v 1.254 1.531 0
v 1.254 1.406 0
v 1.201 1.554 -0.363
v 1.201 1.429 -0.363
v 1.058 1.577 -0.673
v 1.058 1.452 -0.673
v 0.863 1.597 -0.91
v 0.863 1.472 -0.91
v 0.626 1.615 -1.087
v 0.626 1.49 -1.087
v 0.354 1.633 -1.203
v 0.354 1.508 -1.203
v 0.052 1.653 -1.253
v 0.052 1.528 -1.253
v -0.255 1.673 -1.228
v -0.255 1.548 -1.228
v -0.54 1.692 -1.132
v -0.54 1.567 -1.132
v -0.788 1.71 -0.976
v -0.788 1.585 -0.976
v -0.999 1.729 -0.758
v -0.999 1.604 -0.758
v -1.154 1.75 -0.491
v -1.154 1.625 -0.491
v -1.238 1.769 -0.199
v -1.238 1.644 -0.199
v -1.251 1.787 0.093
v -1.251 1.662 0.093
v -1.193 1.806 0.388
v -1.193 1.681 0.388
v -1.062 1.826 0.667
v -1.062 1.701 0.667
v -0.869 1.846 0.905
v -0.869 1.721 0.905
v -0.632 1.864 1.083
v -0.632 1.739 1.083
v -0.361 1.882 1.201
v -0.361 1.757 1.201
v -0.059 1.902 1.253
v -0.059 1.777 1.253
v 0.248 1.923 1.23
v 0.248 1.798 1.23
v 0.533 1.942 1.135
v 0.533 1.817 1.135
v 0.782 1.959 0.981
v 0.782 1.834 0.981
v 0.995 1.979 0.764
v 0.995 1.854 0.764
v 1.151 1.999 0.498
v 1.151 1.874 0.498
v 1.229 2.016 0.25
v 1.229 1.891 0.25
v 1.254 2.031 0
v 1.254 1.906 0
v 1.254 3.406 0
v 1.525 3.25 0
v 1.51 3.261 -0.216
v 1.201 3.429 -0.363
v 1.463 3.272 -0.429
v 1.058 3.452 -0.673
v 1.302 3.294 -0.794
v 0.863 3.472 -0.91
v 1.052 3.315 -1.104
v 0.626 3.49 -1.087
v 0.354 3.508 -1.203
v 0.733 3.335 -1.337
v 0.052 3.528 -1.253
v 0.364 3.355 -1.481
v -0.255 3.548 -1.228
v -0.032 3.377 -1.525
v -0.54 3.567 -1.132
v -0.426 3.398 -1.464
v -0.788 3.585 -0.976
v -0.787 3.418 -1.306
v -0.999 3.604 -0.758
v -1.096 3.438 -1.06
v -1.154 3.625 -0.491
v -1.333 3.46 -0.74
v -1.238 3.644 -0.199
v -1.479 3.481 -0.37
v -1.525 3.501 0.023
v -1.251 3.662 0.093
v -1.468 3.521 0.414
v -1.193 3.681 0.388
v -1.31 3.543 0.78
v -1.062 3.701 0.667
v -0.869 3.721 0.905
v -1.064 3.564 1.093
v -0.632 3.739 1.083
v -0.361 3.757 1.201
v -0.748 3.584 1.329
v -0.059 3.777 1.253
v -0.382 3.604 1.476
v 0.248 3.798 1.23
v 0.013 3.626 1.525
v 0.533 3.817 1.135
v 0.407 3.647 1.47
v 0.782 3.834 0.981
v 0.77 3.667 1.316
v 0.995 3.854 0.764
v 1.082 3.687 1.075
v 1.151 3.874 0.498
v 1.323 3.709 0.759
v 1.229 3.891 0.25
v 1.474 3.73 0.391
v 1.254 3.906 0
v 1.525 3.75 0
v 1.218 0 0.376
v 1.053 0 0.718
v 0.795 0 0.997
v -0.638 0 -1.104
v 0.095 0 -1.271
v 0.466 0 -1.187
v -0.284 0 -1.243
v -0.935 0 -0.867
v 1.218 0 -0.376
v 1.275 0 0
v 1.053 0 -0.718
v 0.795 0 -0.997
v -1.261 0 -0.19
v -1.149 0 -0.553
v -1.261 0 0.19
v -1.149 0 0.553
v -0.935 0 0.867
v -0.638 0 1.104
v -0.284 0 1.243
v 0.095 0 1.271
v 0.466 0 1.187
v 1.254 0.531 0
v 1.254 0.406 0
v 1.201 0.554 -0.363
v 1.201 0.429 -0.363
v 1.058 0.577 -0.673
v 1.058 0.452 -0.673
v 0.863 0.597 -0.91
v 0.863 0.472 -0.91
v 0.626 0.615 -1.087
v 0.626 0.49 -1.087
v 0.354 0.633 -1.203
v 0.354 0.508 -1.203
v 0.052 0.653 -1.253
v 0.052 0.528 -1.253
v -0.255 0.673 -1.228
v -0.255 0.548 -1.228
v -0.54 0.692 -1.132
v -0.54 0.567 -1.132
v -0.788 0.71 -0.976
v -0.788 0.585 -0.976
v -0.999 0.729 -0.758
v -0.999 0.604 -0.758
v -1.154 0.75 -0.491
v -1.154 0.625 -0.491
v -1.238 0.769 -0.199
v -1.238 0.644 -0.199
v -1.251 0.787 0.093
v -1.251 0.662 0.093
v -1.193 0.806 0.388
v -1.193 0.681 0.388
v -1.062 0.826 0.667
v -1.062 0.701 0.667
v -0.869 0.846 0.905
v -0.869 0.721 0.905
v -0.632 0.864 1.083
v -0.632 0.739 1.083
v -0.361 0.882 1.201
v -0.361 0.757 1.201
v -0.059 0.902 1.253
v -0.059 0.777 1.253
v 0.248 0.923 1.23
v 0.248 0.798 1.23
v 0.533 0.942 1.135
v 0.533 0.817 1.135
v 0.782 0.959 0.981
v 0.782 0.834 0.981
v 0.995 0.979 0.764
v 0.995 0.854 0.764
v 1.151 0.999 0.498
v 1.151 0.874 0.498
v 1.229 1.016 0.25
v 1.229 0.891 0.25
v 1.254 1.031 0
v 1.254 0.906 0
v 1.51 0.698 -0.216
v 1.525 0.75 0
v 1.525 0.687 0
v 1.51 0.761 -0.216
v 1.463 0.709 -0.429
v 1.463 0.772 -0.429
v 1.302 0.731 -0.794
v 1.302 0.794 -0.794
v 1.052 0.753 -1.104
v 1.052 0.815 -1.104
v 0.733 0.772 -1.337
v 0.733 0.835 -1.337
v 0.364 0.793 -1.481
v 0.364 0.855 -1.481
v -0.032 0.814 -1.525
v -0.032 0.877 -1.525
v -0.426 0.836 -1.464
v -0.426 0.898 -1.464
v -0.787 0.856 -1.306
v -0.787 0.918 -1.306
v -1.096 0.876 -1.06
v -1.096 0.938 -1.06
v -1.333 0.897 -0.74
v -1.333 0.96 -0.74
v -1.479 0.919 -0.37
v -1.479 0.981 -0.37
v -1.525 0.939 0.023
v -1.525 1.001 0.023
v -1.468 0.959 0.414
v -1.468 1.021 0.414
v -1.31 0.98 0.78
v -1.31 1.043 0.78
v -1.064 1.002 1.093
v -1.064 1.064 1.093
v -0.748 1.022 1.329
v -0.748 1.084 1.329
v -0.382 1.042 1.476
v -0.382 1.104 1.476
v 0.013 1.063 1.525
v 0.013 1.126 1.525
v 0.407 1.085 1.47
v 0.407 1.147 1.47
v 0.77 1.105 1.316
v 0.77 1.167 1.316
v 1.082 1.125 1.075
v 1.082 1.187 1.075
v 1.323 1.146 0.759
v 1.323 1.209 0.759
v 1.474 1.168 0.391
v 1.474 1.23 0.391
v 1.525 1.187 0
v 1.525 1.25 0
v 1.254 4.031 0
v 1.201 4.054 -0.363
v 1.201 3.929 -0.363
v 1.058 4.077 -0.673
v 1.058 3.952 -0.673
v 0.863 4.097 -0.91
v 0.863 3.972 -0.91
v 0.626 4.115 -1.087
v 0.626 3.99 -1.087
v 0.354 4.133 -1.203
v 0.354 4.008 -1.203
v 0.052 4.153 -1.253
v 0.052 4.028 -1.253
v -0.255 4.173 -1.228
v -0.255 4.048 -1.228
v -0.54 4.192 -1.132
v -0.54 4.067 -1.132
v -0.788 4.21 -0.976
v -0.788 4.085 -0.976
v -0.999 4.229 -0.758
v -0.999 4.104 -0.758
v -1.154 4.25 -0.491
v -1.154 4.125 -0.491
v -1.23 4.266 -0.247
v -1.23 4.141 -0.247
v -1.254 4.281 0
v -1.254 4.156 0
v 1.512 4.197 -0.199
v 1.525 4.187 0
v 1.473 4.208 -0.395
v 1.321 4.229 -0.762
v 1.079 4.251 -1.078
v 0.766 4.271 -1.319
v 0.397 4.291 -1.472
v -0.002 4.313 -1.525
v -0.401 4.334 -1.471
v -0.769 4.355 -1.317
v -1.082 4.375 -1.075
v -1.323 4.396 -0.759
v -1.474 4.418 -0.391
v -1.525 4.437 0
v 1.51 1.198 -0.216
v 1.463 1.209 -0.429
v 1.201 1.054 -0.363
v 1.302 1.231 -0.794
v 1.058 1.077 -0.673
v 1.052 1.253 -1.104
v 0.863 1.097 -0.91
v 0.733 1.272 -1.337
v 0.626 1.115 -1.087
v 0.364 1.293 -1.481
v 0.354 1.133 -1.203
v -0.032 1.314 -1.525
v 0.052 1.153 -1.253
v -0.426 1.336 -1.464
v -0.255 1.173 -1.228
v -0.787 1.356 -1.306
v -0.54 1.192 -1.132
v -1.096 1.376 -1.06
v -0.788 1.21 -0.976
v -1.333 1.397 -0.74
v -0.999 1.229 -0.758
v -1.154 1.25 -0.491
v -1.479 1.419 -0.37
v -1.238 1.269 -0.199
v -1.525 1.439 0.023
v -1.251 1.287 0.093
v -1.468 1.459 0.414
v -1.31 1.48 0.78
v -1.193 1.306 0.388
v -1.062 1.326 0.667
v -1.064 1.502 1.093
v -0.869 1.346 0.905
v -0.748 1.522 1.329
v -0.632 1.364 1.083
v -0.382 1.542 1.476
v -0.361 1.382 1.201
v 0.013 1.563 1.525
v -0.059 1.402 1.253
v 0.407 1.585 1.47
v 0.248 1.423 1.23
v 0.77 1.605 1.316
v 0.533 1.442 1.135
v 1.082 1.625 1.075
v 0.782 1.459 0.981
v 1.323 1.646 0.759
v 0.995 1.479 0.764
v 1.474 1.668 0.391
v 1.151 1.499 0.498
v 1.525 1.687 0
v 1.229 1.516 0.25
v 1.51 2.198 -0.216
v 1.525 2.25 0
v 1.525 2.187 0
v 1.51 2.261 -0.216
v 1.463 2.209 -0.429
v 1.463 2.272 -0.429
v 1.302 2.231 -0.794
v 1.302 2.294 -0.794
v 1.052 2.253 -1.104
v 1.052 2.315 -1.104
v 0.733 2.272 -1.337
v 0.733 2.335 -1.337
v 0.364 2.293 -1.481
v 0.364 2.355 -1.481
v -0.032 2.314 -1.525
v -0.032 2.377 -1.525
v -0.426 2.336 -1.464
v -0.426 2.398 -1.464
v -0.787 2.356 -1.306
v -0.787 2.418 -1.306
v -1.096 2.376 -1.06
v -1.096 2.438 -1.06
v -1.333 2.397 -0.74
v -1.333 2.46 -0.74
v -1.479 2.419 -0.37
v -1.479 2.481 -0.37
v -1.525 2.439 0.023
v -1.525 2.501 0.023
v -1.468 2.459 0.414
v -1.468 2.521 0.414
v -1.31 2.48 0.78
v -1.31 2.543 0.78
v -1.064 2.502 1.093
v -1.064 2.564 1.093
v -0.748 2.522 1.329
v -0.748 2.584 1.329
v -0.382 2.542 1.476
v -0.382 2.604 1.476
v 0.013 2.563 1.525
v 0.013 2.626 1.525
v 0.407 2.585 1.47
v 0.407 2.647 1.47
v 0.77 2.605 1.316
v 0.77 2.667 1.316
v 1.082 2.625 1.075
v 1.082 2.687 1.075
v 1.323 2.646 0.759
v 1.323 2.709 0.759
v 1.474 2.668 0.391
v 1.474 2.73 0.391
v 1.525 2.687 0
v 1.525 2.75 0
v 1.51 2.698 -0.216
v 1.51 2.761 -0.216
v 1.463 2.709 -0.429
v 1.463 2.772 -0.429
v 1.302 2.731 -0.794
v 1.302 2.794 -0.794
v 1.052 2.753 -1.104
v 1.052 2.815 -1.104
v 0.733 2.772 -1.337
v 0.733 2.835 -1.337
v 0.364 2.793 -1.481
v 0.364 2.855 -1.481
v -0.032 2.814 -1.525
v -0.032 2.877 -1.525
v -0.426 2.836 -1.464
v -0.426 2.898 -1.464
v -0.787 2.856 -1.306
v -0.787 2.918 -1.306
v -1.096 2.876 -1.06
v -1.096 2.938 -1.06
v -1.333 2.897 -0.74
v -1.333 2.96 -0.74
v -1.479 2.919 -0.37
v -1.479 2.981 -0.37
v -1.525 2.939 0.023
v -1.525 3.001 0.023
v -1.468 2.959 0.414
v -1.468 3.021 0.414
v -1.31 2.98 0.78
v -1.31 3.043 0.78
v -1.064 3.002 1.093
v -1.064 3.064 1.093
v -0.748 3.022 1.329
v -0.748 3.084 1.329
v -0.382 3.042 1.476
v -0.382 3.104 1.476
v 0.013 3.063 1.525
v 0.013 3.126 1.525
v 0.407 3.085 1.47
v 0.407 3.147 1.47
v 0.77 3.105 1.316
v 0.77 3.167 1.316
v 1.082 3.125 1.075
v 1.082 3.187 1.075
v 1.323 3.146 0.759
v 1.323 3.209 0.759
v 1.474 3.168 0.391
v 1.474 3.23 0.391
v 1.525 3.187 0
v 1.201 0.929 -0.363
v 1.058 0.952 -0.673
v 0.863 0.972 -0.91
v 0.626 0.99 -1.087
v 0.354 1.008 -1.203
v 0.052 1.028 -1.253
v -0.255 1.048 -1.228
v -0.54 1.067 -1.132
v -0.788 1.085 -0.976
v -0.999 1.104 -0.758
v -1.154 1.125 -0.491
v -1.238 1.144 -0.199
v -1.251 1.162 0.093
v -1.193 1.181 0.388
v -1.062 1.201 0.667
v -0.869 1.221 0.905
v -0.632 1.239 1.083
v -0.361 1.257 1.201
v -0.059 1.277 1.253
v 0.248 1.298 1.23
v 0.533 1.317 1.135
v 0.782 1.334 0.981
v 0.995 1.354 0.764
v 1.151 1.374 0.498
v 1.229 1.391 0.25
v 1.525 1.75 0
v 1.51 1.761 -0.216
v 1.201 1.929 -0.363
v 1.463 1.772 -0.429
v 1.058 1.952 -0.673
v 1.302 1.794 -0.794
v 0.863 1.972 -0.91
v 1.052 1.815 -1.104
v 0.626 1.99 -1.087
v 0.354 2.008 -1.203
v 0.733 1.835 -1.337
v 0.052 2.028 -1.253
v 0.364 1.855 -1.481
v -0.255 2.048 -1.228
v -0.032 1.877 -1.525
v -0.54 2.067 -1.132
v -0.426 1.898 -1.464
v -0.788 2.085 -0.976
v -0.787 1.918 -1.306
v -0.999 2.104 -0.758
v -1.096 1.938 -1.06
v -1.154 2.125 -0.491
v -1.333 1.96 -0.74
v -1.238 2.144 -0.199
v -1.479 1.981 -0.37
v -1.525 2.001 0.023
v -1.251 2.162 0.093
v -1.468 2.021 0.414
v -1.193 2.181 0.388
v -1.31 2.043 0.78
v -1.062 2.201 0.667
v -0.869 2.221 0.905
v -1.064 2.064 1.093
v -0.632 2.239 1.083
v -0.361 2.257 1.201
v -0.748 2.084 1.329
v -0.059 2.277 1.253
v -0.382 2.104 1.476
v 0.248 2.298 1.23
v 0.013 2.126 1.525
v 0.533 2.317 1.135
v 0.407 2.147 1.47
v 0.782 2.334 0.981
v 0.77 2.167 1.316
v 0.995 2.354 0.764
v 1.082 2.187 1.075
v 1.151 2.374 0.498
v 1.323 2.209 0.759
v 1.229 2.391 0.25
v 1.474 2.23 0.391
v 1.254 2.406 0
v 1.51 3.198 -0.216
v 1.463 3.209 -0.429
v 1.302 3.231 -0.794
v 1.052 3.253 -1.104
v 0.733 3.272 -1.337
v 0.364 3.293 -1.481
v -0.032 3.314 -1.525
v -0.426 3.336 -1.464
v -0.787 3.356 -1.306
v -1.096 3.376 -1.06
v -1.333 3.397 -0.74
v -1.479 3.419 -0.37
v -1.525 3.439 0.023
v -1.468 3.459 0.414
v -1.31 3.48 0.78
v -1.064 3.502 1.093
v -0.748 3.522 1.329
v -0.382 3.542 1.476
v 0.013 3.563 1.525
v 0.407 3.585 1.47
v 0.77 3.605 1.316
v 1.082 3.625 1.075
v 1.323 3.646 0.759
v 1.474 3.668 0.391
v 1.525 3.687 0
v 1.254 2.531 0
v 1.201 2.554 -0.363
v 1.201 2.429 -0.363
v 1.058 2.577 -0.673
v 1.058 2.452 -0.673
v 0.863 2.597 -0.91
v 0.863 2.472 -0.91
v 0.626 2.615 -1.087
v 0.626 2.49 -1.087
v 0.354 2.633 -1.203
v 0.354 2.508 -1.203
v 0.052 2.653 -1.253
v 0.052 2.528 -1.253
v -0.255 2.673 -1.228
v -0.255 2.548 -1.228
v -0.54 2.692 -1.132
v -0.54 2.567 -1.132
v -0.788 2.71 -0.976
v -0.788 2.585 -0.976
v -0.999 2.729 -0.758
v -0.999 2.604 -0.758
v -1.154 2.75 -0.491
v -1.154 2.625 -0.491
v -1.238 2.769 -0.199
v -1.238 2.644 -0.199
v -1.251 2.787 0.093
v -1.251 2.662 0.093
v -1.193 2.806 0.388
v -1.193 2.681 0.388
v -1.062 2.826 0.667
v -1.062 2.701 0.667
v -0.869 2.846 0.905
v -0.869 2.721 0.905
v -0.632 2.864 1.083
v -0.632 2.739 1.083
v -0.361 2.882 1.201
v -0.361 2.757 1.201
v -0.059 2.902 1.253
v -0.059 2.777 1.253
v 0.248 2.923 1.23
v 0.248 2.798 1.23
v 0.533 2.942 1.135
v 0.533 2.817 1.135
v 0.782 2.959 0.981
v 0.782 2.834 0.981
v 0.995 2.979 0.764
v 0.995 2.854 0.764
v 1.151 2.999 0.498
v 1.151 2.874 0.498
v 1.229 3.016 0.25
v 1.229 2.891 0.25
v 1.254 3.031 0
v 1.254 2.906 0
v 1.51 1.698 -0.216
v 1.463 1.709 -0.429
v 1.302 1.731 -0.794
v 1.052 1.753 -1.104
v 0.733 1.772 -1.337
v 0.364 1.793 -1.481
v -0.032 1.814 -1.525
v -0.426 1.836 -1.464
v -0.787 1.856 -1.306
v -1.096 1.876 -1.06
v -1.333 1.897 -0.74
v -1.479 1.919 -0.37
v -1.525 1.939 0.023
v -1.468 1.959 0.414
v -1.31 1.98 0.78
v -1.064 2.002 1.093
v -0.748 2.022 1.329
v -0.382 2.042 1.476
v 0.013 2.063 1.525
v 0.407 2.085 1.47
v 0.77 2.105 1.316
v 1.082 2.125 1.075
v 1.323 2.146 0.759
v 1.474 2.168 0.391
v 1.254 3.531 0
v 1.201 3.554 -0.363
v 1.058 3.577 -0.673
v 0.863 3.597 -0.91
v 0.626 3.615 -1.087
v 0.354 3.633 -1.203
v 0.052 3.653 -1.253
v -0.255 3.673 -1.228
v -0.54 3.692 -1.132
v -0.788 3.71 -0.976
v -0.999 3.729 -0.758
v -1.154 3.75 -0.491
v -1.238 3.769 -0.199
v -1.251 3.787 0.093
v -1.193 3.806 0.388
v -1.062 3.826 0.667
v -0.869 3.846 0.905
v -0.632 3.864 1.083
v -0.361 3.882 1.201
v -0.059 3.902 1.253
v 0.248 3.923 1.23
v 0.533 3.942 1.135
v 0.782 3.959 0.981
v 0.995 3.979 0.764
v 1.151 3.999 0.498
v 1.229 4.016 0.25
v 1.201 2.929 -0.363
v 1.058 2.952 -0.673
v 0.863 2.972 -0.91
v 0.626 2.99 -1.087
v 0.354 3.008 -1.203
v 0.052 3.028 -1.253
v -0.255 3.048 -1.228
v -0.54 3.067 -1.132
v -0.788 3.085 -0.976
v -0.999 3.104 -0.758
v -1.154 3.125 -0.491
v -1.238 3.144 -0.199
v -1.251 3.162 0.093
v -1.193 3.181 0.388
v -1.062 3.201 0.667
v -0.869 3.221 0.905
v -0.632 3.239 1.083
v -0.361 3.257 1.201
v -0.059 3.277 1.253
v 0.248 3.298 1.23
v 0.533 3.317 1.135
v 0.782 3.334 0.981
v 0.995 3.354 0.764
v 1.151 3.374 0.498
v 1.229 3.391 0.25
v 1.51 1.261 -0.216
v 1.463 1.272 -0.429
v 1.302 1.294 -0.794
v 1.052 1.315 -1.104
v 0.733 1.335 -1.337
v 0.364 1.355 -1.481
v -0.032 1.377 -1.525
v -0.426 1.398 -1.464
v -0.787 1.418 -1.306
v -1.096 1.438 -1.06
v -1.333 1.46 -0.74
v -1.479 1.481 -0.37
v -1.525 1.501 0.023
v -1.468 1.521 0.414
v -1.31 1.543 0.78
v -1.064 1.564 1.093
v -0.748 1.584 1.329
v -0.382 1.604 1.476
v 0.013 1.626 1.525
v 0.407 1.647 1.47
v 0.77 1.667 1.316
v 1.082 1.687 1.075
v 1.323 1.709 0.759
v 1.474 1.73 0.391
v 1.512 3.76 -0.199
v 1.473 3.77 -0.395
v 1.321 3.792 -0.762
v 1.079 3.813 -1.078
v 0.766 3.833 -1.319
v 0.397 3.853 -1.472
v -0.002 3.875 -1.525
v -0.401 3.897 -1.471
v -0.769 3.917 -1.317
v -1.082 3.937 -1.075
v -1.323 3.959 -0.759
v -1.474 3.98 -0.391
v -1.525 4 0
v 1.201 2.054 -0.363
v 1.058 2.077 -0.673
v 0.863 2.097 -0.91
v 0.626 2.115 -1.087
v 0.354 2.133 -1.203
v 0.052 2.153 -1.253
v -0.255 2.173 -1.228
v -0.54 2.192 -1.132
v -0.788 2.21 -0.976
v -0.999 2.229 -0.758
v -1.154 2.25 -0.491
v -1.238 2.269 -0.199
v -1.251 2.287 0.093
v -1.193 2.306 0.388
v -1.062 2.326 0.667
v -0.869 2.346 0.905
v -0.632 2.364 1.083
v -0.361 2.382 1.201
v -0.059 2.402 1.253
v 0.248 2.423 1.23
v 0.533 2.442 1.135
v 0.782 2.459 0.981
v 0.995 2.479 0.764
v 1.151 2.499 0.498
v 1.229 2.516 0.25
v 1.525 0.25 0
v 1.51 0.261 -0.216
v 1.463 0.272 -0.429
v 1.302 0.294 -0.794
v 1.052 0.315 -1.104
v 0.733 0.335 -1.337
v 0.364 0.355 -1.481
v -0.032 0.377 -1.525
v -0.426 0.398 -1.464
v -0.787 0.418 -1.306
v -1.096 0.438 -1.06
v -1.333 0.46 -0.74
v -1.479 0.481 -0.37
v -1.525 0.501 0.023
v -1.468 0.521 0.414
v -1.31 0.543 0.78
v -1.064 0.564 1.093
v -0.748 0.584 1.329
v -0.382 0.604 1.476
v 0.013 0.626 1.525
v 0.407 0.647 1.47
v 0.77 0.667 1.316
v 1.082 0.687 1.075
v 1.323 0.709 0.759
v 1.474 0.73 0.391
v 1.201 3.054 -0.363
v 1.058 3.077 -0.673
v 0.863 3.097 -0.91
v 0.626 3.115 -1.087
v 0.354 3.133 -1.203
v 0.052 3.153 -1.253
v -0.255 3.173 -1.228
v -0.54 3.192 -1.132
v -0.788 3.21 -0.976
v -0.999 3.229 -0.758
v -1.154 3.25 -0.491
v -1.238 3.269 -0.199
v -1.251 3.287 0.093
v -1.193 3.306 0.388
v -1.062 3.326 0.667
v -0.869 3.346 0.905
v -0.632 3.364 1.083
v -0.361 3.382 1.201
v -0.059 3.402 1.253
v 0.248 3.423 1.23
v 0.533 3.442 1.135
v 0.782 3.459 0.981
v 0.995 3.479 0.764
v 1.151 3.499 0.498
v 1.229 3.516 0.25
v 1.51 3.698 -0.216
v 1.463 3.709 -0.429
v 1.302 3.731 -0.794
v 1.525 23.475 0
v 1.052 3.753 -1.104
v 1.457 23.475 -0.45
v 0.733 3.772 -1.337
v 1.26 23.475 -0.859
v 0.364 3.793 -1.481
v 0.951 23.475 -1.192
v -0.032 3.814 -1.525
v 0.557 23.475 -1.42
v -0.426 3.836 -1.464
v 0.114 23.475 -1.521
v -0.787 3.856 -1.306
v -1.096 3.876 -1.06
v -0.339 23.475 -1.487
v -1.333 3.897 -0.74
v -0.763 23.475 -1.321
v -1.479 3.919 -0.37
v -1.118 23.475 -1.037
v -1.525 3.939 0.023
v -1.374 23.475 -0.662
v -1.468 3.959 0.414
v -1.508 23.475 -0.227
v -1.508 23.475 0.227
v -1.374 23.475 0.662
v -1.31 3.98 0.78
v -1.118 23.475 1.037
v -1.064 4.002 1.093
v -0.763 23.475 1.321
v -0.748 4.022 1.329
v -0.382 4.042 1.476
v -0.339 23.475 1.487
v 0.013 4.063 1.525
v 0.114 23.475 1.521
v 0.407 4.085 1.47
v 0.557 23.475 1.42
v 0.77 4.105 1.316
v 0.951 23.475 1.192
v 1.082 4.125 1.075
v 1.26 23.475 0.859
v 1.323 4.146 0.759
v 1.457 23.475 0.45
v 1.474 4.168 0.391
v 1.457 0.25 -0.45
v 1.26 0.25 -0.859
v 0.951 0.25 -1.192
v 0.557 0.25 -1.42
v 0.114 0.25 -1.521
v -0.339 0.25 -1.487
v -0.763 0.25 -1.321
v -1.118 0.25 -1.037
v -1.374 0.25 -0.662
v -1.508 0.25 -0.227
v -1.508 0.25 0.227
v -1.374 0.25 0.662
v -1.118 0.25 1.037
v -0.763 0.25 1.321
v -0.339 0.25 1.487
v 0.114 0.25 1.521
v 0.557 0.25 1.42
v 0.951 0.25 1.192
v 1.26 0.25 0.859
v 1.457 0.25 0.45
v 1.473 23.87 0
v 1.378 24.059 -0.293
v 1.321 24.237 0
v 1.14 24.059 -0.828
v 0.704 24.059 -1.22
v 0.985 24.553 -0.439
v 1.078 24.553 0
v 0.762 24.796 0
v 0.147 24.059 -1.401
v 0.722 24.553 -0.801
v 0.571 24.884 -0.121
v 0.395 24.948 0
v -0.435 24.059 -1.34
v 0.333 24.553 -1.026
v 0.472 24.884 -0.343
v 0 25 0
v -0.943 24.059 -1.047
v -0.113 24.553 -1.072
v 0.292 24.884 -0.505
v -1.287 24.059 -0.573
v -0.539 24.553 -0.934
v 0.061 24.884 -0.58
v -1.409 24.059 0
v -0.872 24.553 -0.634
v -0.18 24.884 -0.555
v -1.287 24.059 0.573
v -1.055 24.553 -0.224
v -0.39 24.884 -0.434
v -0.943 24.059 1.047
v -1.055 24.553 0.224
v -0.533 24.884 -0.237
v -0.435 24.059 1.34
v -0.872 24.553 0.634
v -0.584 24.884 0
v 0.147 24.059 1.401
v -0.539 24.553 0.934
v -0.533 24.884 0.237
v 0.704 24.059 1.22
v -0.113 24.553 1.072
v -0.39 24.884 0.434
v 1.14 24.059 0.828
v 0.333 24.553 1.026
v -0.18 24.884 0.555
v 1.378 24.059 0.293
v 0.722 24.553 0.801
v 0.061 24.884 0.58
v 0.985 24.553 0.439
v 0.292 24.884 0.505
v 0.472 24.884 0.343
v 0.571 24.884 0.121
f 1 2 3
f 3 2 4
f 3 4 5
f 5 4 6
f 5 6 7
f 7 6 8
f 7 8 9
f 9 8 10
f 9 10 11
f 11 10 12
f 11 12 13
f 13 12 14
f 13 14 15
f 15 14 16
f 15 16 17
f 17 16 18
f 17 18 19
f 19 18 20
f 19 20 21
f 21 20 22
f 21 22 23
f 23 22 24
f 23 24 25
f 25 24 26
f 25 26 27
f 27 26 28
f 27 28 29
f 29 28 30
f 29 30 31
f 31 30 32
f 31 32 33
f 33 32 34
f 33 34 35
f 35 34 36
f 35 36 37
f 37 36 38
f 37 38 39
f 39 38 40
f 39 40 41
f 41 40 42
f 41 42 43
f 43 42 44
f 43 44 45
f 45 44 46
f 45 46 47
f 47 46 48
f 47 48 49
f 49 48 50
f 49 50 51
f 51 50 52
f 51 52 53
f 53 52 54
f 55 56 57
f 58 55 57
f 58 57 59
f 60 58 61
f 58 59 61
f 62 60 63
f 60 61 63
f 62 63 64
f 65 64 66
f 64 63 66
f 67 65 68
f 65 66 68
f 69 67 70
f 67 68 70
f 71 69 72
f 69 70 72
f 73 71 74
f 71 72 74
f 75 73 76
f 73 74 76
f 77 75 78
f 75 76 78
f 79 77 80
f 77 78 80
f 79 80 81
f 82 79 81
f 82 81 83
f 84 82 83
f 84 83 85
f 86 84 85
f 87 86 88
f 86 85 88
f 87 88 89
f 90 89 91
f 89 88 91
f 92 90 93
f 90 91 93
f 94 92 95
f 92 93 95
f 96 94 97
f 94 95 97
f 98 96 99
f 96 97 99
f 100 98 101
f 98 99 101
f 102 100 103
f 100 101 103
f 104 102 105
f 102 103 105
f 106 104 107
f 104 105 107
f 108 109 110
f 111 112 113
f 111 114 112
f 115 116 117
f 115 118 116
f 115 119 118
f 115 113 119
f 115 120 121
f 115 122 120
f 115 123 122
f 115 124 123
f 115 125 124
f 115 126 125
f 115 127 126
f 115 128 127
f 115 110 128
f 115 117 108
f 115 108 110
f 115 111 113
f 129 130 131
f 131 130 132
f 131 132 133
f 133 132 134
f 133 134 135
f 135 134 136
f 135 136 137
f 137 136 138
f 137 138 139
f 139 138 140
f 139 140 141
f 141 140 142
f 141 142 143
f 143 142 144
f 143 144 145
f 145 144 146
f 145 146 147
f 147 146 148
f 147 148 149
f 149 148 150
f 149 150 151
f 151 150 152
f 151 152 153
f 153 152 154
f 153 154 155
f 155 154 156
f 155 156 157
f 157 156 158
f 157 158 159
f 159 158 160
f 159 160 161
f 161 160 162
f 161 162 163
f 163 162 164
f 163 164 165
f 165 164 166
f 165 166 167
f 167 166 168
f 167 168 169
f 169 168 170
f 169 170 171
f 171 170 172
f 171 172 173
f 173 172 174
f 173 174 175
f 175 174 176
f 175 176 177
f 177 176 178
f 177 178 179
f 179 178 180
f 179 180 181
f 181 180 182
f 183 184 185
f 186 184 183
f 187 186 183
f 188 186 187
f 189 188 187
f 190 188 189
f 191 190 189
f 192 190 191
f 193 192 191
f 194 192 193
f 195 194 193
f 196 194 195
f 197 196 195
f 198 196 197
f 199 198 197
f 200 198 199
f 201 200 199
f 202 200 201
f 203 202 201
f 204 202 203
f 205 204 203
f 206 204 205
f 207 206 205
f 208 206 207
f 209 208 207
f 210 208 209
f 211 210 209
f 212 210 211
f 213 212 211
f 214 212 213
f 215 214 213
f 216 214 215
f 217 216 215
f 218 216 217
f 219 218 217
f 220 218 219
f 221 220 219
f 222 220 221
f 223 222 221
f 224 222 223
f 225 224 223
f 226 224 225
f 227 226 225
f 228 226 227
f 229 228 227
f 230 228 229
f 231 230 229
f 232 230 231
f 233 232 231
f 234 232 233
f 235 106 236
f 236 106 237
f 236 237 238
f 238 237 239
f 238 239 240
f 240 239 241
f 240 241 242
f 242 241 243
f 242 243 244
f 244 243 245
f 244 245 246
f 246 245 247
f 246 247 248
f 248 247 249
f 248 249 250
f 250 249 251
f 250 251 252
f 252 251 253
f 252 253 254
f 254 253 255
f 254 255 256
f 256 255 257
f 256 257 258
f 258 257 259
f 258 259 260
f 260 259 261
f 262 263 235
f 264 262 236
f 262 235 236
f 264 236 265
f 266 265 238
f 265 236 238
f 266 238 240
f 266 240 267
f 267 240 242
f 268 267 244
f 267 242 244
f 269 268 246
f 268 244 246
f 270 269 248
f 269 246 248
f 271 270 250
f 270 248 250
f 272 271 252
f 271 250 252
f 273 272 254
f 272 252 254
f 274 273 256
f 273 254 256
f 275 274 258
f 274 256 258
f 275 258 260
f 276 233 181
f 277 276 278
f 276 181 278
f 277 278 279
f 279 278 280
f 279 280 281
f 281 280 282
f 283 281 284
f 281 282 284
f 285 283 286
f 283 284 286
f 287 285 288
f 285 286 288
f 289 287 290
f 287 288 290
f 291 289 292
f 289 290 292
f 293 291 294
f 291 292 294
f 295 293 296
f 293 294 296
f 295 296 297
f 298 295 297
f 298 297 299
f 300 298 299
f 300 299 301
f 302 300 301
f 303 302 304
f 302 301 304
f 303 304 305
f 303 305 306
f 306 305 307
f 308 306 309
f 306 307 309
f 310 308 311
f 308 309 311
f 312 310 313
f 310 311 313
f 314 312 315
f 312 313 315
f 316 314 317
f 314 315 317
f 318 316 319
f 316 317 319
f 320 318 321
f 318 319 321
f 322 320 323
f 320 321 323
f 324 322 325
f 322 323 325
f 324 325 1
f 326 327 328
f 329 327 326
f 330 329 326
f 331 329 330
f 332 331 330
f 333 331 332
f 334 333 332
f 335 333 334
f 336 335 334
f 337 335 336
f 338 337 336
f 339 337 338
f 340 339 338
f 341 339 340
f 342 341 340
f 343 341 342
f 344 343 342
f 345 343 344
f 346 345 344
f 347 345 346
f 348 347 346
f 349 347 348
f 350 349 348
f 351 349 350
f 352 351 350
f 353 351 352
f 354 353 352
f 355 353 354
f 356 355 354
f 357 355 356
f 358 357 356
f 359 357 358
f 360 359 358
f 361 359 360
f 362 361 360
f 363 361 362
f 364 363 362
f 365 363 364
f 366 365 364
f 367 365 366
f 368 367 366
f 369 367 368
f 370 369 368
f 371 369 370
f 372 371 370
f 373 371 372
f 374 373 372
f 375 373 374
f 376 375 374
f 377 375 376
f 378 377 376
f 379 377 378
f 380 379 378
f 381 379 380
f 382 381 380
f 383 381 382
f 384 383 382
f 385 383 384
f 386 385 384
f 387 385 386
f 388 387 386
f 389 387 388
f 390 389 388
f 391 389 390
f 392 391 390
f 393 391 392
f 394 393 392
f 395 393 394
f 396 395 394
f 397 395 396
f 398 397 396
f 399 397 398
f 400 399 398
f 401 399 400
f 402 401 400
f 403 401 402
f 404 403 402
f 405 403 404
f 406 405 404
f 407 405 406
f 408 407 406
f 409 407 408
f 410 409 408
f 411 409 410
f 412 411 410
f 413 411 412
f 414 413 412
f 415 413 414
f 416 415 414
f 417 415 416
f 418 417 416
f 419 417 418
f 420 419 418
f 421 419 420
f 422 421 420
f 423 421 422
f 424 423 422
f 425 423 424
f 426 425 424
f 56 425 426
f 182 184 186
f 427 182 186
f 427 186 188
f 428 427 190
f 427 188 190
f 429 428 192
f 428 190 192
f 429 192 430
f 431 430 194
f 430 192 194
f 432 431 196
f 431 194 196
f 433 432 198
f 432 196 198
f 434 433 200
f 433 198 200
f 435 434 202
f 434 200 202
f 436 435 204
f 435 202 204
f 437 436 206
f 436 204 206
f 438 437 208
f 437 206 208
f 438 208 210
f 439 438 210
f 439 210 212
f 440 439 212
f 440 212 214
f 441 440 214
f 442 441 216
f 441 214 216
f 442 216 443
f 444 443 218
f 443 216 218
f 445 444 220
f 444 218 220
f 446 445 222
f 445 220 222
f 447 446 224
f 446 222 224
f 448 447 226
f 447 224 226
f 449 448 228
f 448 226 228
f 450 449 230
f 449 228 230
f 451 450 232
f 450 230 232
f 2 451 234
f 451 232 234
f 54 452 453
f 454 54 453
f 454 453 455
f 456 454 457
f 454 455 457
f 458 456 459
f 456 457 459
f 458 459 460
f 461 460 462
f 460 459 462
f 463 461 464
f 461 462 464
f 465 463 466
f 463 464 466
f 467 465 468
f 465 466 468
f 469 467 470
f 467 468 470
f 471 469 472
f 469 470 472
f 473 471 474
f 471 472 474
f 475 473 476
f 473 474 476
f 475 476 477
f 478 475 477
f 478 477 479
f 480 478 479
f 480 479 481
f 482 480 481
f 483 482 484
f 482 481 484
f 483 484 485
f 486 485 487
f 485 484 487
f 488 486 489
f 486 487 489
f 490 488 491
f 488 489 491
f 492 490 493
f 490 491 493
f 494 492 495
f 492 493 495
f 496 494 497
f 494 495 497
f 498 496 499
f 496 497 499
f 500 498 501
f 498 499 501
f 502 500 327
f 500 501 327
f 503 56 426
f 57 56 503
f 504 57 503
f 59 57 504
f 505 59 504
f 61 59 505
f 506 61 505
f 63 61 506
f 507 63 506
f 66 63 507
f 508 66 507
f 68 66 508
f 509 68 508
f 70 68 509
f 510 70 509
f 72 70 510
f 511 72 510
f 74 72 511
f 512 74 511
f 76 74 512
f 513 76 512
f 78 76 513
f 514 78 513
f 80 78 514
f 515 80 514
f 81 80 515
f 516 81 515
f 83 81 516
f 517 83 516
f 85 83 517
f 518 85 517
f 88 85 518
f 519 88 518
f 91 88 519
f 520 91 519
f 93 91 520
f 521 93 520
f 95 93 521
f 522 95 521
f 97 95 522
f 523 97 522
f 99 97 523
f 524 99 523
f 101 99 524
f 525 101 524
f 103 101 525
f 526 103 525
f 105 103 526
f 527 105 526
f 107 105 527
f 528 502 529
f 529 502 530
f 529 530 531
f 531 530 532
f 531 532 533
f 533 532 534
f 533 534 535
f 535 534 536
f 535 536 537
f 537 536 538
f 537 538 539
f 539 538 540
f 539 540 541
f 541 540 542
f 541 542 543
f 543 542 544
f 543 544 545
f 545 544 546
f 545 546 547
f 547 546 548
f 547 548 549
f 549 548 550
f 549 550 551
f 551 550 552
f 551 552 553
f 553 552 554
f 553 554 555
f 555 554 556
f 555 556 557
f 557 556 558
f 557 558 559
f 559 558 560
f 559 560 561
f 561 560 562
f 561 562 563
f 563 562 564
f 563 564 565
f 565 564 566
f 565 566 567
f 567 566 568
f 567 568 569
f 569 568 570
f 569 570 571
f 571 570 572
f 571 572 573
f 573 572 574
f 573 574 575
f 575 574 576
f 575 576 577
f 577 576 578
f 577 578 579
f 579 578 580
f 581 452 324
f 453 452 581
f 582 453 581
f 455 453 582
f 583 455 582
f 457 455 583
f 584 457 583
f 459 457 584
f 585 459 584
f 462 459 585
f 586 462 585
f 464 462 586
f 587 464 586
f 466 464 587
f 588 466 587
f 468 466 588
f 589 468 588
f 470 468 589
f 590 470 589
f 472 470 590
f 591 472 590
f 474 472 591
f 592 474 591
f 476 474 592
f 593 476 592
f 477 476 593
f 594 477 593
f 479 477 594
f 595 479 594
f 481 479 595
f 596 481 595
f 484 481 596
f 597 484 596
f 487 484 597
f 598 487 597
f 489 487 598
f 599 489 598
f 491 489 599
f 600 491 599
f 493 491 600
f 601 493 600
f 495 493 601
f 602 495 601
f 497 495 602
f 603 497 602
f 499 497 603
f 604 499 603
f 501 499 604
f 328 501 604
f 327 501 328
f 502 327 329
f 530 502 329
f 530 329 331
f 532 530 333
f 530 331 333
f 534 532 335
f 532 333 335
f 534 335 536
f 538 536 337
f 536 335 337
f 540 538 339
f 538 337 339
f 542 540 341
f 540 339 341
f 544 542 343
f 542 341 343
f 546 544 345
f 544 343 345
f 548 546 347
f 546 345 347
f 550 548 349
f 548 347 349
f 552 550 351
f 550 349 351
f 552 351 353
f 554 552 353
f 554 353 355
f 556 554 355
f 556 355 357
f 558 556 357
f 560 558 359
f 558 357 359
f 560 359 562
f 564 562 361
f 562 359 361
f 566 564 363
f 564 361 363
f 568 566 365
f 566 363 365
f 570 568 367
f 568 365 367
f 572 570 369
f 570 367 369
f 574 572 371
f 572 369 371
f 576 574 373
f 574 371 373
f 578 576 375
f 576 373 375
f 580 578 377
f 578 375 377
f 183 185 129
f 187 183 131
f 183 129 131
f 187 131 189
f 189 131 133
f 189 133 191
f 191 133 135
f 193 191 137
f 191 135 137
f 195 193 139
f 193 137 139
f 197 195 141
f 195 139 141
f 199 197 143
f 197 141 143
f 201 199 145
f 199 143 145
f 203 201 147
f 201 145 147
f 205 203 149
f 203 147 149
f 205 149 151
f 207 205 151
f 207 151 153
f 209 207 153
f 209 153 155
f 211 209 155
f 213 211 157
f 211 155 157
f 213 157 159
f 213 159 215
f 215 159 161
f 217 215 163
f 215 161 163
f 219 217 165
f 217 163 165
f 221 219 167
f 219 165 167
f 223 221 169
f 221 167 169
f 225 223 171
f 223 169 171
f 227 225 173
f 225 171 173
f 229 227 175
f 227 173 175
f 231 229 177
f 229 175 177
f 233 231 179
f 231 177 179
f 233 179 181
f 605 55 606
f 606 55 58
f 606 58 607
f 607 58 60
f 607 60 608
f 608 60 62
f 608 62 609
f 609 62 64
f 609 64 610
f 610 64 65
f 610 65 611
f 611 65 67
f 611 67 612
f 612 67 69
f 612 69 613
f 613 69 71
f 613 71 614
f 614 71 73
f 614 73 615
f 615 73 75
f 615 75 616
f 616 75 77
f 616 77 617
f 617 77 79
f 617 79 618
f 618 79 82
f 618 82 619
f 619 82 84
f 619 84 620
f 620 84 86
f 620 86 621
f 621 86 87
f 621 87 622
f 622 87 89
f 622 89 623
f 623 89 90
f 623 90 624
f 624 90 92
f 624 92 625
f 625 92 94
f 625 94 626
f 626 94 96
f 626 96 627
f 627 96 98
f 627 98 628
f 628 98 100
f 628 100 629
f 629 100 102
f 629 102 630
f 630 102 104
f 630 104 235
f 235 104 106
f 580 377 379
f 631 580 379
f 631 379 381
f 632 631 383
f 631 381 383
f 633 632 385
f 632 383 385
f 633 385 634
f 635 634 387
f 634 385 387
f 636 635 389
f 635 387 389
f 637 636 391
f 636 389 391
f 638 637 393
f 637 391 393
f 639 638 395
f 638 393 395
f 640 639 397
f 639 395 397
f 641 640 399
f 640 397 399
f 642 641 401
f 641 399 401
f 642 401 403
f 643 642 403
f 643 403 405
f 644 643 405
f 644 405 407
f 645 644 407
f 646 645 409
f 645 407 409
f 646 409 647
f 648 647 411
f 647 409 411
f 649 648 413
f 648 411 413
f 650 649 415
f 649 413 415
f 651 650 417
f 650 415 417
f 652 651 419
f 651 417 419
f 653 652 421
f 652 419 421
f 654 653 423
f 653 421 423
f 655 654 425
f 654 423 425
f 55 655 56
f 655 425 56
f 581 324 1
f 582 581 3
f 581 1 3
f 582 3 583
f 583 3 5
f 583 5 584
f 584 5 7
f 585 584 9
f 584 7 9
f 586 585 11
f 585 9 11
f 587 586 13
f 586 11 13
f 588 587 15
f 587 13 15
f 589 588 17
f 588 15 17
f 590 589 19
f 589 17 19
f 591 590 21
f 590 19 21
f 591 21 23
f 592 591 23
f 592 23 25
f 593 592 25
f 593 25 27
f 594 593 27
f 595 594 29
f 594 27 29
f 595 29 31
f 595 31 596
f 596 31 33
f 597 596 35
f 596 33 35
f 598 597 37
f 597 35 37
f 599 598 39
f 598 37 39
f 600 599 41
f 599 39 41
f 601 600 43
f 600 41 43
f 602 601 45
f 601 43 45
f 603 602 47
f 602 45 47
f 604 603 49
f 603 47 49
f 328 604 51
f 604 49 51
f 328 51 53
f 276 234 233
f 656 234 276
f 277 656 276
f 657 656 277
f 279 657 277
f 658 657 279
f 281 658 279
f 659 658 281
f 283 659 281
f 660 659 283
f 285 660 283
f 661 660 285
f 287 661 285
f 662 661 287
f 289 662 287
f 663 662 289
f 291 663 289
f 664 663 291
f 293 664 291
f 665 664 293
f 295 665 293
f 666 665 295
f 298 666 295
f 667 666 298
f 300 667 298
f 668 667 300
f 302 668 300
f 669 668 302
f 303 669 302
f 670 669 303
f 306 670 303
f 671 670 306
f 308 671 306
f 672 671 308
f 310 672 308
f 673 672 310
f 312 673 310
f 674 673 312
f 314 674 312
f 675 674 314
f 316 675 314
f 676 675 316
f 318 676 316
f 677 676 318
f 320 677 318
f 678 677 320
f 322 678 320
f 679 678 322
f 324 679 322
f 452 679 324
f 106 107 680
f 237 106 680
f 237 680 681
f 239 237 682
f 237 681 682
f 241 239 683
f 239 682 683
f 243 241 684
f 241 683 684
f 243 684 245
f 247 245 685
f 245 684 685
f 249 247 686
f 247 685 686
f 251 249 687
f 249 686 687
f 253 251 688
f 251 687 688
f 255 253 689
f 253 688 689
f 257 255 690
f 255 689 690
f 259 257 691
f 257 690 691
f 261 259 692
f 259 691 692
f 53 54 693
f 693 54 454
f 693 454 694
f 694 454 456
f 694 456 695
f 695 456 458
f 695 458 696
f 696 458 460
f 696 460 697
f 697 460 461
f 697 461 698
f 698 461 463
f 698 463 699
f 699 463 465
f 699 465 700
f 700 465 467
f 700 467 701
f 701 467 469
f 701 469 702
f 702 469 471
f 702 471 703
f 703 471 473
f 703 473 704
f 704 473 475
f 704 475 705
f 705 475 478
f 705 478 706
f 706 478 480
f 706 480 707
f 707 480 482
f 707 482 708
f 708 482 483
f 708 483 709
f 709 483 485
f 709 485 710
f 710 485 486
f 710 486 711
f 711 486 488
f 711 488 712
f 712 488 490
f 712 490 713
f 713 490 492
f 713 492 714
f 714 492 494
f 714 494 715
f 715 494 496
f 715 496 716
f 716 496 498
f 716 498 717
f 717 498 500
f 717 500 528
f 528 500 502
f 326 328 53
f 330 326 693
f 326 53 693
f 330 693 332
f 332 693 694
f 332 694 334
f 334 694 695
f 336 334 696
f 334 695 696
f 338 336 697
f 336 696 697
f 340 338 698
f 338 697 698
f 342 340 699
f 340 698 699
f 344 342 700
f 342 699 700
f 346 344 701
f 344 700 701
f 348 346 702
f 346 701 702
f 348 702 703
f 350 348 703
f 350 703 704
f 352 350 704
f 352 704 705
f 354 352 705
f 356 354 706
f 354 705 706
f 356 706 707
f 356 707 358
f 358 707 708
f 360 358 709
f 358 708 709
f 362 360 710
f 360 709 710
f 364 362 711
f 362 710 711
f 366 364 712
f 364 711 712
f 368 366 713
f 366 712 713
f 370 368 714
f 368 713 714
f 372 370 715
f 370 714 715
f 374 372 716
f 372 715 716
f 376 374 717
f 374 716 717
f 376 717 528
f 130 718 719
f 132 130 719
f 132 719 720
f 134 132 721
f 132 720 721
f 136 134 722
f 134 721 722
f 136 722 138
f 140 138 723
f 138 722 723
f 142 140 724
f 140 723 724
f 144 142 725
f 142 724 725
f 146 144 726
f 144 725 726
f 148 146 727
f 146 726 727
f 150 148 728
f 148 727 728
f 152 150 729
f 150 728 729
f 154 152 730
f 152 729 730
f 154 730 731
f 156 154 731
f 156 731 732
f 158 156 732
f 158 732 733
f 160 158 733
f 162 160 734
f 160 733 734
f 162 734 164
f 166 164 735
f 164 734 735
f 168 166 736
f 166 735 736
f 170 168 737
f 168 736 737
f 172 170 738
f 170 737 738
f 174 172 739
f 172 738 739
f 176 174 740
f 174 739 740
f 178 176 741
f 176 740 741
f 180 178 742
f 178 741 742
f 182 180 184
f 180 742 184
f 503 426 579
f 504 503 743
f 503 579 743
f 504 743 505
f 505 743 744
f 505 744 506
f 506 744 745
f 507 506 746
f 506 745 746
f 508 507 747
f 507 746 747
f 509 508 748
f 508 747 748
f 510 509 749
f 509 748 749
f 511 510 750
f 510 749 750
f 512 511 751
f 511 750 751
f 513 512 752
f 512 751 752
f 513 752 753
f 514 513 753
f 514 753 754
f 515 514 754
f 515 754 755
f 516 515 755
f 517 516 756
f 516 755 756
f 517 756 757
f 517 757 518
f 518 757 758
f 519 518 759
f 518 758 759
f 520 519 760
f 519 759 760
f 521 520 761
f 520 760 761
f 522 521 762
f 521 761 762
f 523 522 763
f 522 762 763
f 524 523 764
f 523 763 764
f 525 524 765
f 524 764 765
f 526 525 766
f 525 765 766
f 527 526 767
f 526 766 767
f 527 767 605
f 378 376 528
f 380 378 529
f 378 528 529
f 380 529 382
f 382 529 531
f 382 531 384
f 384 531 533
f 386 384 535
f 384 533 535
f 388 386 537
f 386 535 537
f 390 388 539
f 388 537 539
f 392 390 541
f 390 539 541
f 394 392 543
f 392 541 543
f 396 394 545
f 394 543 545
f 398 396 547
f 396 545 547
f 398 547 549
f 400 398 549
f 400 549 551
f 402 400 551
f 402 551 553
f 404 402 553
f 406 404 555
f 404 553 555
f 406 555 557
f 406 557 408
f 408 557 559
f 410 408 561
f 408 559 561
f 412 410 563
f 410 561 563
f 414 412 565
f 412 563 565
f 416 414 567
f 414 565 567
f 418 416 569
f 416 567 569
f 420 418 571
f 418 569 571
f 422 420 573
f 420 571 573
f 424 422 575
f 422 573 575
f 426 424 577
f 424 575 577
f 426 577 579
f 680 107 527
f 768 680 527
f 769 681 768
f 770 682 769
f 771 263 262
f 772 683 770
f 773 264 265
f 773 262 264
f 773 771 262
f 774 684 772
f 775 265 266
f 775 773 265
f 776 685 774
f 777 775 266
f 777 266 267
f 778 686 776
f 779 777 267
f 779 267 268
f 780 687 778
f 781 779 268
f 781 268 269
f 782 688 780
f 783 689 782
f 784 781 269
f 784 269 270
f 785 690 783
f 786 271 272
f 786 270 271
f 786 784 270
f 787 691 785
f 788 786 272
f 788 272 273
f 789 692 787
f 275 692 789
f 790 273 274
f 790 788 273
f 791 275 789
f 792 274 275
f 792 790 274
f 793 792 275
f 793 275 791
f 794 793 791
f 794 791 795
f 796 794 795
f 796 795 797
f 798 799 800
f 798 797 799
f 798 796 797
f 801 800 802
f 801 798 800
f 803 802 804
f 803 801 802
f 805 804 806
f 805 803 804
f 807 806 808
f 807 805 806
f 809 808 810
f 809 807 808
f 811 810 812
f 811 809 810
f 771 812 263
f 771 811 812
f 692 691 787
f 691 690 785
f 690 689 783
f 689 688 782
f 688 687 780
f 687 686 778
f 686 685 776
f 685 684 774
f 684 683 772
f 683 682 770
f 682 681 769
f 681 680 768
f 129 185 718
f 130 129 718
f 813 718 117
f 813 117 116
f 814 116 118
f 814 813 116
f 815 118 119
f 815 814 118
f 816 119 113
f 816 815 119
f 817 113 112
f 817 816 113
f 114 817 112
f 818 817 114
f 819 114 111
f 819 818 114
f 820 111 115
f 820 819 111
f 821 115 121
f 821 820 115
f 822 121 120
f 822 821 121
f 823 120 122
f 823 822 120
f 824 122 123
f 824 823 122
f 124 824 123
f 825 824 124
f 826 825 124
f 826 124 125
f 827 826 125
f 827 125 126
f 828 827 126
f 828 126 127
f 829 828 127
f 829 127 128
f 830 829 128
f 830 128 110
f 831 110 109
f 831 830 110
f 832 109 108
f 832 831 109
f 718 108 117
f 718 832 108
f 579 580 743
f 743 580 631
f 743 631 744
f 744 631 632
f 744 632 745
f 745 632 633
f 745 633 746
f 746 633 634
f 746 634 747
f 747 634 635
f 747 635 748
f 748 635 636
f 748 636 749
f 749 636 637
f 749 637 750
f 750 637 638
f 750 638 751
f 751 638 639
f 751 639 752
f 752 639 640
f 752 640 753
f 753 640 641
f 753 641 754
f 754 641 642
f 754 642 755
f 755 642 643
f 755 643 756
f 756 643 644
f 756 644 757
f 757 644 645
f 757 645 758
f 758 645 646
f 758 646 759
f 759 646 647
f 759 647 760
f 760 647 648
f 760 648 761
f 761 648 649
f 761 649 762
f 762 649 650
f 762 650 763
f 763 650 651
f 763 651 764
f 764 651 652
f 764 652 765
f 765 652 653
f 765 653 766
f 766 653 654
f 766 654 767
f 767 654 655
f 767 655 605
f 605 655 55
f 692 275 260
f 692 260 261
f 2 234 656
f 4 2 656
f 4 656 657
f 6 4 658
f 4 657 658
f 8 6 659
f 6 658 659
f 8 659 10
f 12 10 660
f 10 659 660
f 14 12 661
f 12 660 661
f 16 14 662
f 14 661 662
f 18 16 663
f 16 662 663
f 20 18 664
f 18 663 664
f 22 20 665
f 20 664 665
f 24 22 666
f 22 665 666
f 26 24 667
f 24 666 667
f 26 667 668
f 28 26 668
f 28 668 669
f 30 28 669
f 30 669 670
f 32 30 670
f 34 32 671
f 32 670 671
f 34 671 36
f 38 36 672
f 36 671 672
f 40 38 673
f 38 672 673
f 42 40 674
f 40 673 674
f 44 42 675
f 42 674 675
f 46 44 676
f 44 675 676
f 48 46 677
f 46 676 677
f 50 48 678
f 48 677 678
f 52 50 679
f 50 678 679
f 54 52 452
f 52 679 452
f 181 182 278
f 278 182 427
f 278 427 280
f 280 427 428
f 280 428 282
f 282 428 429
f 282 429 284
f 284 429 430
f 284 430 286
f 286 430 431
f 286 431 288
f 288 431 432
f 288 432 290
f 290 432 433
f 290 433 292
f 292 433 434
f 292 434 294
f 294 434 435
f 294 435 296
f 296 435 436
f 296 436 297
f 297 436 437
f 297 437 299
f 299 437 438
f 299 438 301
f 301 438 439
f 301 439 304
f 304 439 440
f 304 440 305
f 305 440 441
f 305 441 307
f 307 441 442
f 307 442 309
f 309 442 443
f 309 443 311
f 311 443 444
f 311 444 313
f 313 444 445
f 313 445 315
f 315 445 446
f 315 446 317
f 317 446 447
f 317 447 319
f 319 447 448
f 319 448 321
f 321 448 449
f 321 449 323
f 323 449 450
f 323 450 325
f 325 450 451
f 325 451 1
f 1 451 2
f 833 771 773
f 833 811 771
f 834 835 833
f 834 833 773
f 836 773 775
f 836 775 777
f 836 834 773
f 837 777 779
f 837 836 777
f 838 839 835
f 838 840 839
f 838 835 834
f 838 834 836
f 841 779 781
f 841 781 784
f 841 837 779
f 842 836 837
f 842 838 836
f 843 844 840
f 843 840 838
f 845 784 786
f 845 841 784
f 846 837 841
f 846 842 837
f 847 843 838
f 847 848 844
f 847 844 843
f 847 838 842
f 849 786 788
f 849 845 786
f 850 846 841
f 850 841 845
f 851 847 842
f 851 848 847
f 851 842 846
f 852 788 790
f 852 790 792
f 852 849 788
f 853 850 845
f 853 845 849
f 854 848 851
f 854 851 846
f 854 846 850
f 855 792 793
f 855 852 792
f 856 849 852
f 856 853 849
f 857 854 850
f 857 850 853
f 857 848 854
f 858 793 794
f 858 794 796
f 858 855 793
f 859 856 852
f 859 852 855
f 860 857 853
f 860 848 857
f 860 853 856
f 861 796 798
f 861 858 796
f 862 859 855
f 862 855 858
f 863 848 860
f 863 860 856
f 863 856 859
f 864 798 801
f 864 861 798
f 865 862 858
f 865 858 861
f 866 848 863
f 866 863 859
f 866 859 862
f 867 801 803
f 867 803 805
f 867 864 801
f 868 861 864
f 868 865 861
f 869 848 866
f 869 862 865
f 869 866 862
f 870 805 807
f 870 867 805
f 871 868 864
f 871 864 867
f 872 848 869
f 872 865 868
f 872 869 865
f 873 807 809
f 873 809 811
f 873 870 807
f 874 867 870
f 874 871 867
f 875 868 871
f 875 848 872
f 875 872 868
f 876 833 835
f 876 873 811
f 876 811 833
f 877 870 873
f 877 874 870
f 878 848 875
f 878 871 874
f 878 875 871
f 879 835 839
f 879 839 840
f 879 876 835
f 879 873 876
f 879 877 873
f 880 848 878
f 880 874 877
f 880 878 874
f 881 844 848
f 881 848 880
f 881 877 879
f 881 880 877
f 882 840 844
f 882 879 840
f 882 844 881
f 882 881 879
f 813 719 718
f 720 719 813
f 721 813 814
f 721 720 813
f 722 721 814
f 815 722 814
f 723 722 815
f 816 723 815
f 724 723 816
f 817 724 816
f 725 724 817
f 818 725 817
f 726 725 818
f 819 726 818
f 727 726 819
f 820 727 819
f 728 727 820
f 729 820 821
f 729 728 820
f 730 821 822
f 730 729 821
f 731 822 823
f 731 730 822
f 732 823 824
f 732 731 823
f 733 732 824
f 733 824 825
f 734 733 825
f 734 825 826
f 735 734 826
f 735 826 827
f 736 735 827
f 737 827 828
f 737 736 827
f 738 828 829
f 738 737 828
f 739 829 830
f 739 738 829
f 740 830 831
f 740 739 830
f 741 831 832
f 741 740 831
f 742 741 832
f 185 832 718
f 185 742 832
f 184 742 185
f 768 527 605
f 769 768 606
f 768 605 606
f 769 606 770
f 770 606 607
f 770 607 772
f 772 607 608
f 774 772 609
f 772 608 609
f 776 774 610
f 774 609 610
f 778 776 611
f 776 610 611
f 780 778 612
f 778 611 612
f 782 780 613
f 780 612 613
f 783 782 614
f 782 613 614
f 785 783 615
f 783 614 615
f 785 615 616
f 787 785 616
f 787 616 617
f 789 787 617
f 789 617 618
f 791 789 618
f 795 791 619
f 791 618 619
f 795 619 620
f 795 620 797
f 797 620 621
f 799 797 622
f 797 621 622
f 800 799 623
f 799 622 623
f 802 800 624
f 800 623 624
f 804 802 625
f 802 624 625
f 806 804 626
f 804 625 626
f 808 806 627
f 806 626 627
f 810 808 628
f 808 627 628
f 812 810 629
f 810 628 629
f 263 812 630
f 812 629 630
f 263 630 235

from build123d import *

# Parameters (mm, degrees)
CHAMFUR_BEFORE_THREAD_SIZE = 0.25
THREAD2_PITCH              = 0.5


with BuildPart() as part:
    # Rod Sketch → Rod Revolve (revolve)
    with BuildSketch(Plane.XY):
        with BuildLine():
            Line((0, 0), (1.525, 0))
            Line((1.525, 0), (1.525, 23.475))
            ThreePointArc((1.525, 23.475), (1.078337841, 24.553337841), (0, 25))
            Line((0, 25), (0, 0))
        make_face()
    revolve(axis=Axis((0, 0, 0), (0, 1, 0)))

    # Chamfur Before Thread
    chamfur_before_thread_edges = [part.edges().sort_by_distance(p)[0] for p in [
        (-1.525, 0, 0),
    ]]
    chamfer(chamfur_before_thread_edges, length=CHAMFUR_BEFORE_THREAD_SIZE)

    # Thread2: the profile of Thread Profile2 profile screwed along a right-hand helix of 7.5 turns, 6 arcs to a turn; built about Z, then put on its axis
    thread2_z = Axis((0, 0, 0), (0, 0, 1))
    thread2_corners = [(1.5253, 0, -0.000173205), (1.5253, 0, 0.437673204), (1.254367063, 0, 0.281249999), (1.254367062, 0, 0.156249999)]
    with BuildLine(mode=Mode.PRIVATE) as thread2_profile:
        Line(thread2_corners[0], thread2_corners[1])
        Line(thread2_corners[1], thread2_corners[2])
        Line(thread2_corners[2], thread2_corners[3])
        Line(thread2_corners[3], thread2_corners[0])
    thread2_cap = Face(thread2_profile.wire())
    thread2_turn_angles = [0, 30, 60, 90, 120, 150, 180, 210, 240, 270, 300, 330, 360]
    thread2_turn_weights = [1, 0.8660254037844387, 1, 0.8660254037844387, 1, 0.8660254037844387, 1, 0.8660254037844387, 1, 0.8660254037844387, 1, 0.8660254037844387, 1]
    thread2_turn_rails = [Edge.make_bspline([Vector(p[0], p[1], 0).rotate(thread2_z, thread2_turn_angles[k]) / thread2_turn_weights[k] + Vector(0, 0, p[2] + THREAD2_PITCH * thread2_turn_angles[k] / 360) for k in range(13)], [0, 0, 0, 1, 1, 2, 2, 3, 3, 4, 4, 5, 5, 6, 6, 6], 2, thread2_turn_weights) for p in thread2_corners]
    thread2_turn_sides = [Face.make_surface_from_curves(thread2_turn_rails[p[0]], thread2_turn_rails[p[1]]) for p in [(0, 1), (1, 2), (2, 3), (3, 0)]]
    thread2_last_angles = [2520, 2550, 2580, 2610, 2640, 2670, 2700]
    thread2_last_weights = [1, 0.8660254037844387, 1, 0.8660254037844387, 1, 0.8660254037844426, 1]
    thread2_last_rails = [Edge.make_bspline([Vector(p[0], p[1], 0).rotate(thread2_z, thread2_last_angles[k]) / thread2_last_weights[k] + Vector(0, 0, p[2] + THREAD2_PITCH * thread2_last_angles[k] / 360) for k in range(7)], [0, 0, 0, 1, 1, 2, 2, 3, 3, 3], 2, thread2_last_weights) for p in thread2_corners]
    thread2_last_sides = [Face.make_surface_from_curves(thread2_last_rails[p[0]], thread2_last_rails[p[1]]) for p in [(0, 1), (1, 2), (2, 3), (3, 0)]]
    thread2 = Plane(origin=(0, 0.25, 0), x_dir=(1, 0, 0), z_dir=(0, 1, 0)) * Solid(Shell([*[p.moved(Location((0, 0, THREAD2_PITCH * i))) for i in range(7) for p in thread2_turn_sides], *thread2_last_sides, thread2_cap, thread2_cap.rotate(thread2_z, 2700).moved(Location((0, 0, THREAD2_PITCH * 2700 / 360)))]))
    add(thread2, mode=Mode.SUBTRACT)


solid = part.part
